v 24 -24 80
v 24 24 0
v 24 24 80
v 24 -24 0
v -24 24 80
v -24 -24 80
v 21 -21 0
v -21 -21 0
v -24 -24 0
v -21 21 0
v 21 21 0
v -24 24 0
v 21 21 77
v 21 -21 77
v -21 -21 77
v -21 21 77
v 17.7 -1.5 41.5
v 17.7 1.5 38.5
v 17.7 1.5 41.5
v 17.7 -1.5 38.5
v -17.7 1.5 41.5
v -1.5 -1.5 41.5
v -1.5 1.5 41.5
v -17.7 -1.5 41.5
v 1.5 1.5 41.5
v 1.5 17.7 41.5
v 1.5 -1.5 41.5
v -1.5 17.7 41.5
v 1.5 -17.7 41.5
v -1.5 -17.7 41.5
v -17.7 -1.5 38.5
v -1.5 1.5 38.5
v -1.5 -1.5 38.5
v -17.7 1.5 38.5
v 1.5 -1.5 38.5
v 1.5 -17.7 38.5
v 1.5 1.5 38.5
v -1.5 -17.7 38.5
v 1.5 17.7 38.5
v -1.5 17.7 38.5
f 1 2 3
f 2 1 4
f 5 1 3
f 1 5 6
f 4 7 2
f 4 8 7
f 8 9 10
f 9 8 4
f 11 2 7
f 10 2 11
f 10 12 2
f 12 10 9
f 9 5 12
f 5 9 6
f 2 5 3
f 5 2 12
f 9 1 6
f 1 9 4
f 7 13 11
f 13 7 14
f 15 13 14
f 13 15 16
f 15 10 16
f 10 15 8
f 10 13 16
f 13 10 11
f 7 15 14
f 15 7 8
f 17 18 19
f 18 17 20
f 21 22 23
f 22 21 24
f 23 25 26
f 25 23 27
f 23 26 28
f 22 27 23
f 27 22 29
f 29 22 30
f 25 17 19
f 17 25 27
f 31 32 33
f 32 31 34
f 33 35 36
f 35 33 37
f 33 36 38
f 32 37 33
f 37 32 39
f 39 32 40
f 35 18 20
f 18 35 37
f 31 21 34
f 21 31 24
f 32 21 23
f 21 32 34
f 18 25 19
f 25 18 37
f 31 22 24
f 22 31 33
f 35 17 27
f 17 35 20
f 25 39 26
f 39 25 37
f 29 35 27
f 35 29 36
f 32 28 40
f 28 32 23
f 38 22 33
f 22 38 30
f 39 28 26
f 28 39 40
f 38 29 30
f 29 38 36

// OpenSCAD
$fn = 64;
translate(v = [0, 0, 40.0]) {
	difference() {
		union() {
			difference() {
				cube(center = true, size = [48, 48, 80]);
				translate(v = [0, 0, -1.5]) {
					cube(center = true, size = [42, 42, 77]);
				}
			}
			translate(v = [0, 0, 0]) {
				cube(center = true, size = [35.4, 3, 3]);
			}
			translate(v = [0, 0, 0]) {
				cube(center = true, size = [3, 35.4, 3]);
			}
		}
		union() {
			translate(v = [-11.7, -11.7, -5]) {
				cylinder(h = 15, r = 2.0);
			}
			translate(v = [-11.7, 11.7, -5]) {
				cylinder(h = 15, r = 2.0);
			}
			translate(v = [11.7, -11.7, -5]) {
				cylinder(h = 15, r = 2.0);
			}
			translate(v = [11.7, 11.7, -5]) {
				cylinder(h = 15, r = 2.0);
			}
		}
	}
}
